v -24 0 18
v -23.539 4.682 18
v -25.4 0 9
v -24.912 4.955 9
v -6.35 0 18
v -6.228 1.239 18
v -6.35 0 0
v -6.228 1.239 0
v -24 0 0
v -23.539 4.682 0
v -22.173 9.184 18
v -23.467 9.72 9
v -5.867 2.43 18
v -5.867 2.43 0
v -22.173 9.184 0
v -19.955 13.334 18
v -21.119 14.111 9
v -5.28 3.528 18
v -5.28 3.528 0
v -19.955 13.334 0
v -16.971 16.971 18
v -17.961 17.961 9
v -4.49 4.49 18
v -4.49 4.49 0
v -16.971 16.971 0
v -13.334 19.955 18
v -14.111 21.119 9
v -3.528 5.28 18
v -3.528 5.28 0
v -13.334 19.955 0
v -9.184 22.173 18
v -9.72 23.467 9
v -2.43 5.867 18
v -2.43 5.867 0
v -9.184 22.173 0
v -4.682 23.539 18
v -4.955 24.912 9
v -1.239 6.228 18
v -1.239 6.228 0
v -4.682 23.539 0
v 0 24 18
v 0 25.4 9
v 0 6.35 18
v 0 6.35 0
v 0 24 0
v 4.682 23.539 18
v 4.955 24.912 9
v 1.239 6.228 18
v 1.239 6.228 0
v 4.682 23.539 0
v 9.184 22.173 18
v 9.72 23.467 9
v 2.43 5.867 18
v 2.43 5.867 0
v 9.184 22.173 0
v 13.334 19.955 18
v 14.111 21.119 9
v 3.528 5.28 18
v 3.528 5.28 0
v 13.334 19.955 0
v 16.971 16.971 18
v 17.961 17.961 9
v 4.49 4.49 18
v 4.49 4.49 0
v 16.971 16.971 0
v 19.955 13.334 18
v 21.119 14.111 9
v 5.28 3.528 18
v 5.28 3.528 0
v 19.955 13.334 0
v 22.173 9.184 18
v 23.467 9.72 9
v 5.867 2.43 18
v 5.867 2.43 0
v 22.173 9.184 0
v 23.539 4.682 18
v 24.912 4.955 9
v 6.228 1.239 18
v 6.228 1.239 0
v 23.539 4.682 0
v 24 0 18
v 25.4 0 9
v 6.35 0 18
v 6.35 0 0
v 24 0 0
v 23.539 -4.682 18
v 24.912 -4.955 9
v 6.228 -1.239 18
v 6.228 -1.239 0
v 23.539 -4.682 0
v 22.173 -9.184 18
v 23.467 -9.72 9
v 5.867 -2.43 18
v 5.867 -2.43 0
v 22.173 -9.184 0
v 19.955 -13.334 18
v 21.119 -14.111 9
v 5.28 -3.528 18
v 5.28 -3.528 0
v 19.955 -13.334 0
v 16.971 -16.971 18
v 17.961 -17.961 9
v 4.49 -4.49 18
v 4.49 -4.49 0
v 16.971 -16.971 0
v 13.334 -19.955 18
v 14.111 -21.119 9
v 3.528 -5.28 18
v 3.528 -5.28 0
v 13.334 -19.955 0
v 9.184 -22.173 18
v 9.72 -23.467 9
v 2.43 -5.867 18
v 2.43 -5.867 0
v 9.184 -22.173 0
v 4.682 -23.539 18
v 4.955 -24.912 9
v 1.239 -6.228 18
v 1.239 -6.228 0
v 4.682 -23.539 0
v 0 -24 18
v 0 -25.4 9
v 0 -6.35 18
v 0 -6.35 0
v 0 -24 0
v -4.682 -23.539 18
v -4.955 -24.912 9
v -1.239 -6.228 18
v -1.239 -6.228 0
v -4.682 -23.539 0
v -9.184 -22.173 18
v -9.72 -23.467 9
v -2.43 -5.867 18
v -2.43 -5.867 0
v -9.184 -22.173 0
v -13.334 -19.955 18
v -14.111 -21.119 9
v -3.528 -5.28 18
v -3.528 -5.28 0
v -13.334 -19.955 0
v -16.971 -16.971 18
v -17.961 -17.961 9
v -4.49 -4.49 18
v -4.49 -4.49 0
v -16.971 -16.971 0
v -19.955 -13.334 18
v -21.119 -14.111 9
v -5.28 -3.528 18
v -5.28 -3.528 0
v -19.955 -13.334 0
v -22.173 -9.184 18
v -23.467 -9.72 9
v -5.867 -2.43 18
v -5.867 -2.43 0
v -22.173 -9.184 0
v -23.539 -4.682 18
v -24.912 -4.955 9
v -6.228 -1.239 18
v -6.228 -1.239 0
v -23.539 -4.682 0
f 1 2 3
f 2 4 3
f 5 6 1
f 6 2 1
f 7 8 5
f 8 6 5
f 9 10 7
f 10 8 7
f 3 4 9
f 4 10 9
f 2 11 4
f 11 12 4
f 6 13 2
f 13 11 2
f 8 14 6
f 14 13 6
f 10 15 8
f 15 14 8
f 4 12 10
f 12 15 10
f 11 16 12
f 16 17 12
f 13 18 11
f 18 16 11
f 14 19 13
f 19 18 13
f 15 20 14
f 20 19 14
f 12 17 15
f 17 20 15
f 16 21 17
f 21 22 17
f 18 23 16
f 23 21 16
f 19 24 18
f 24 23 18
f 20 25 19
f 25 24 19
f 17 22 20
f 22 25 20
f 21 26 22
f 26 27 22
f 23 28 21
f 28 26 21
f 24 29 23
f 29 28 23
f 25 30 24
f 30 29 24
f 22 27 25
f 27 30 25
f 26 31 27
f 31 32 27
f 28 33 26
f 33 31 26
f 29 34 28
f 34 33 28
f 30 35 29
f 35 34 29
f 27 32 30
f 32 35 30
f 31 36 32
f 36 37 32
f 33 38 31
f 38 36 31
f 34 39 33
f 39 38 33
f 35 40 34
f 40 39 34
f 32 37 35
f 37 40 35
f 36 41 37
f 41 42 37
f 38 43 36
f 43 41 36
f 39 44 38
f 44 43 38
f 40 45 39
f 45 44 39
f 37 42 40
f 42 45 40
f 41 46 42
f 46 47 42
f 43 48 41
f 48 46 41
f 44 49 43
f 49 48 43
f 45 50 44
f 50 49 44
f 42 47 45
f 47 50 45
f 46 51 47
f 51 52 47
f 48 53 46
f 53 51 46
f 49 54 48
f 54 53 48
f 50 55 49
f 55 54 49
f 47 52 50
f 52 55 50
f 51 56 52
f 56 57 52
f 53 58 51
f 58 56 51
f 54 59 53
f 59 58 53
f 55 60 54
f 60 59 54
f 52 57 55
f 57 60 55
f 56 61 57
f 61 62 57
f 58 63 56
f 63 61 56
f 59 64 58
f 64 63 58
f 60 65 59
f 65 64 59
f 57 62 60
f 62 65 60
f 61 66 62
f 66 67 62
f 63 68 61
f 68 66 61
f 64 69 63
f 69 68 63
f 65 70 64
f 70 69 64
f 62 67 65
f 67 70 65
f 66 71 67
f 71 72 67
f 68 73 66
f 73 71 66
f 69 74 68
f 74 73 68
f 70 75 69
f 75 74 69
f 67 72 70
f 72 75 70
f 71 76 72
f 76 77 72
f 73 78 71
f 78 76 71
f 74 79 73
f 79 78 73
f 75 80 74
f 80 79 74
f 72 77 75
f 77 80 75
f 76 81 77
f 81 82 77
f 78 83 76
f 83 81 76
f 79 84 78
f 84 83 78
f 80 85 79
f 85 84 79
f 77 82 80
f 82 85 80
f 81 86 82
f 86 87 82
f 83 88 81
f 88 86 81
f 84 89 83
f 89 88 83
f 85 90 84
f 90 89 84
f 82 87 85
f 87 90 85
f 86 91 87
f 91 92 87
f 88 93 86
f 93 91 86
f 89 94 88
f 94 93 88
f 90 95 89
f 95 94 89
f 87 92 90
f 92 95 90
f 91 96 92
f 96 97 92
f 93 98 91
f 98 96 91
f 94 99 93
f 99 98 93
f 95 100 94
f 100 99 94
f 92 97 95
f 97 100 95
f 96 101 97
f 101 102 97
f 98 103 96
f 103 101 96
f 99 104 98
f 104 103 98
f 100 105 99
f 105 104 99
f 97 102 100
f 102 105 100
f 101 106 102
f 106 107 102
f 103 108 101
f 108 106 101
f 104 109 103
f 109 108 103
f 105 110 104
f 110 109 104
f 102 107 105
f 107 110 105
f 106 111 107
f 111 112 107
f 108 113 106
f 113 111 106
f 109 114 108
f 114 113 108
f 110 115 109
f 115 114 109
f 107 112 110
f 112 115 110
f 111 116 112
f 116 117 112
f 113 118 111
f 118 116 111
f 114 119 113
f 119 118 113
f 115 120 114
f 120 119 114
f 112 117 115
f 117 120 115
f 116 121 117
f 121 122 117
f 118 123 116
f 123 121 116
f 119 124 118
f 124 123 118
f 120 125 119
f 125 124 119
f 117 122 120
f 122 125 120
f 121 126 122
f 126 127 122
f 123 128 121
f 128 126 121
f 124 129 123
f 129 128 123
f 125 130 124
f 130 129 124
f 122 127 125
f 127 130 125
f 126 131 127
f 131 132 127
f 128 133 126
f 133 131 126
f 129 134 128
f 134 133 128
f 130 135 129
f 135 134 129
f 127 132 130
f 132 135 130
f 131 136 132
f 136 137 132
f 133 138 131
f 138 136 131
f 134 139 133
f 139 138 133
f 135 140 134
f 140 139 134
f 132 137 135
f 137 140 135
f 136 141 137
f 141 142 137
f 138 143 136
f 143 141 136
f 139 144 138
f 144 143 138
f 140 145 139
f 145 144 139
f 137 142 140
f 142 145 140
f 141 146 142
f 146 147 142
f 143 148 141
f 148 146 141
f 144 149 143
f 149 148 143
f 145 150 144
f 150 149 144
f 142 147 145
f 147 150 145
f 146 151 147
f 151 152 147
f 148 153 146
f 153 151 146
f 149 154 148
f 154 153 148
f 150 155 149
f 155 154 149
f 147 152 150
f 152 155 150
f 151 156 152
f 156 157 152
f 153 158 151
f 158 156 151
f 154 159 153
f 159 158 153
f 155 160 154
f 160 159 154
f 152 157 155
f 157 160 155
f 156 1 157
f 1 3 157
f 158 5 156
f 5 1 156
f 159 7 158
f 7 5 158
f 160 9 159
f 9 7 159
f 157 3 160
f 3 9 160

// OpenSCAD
$fn = 32;

// ----------------------------------------------------------------------
// Belt roller: 48 mm barrel, 18 mm wide, bore 12.7 mm
// ----------------------------------------------------------------------

// --- parameters (mm) ---
bore_d = 12.7;            // bore
barrel_d = 48;            // barrel diameter
roller_w = 18;            // roller width
crown = 1.4;              // crown height at mid width

roller_profile = [[6.35, 0], [24, 0], [25.4, 9], [24, 18], [6.35, 18]];

/* the profile stays clear of the axis, so the bore comes out of the revolve */
rotate_extrude() polygon(roller_profile);
